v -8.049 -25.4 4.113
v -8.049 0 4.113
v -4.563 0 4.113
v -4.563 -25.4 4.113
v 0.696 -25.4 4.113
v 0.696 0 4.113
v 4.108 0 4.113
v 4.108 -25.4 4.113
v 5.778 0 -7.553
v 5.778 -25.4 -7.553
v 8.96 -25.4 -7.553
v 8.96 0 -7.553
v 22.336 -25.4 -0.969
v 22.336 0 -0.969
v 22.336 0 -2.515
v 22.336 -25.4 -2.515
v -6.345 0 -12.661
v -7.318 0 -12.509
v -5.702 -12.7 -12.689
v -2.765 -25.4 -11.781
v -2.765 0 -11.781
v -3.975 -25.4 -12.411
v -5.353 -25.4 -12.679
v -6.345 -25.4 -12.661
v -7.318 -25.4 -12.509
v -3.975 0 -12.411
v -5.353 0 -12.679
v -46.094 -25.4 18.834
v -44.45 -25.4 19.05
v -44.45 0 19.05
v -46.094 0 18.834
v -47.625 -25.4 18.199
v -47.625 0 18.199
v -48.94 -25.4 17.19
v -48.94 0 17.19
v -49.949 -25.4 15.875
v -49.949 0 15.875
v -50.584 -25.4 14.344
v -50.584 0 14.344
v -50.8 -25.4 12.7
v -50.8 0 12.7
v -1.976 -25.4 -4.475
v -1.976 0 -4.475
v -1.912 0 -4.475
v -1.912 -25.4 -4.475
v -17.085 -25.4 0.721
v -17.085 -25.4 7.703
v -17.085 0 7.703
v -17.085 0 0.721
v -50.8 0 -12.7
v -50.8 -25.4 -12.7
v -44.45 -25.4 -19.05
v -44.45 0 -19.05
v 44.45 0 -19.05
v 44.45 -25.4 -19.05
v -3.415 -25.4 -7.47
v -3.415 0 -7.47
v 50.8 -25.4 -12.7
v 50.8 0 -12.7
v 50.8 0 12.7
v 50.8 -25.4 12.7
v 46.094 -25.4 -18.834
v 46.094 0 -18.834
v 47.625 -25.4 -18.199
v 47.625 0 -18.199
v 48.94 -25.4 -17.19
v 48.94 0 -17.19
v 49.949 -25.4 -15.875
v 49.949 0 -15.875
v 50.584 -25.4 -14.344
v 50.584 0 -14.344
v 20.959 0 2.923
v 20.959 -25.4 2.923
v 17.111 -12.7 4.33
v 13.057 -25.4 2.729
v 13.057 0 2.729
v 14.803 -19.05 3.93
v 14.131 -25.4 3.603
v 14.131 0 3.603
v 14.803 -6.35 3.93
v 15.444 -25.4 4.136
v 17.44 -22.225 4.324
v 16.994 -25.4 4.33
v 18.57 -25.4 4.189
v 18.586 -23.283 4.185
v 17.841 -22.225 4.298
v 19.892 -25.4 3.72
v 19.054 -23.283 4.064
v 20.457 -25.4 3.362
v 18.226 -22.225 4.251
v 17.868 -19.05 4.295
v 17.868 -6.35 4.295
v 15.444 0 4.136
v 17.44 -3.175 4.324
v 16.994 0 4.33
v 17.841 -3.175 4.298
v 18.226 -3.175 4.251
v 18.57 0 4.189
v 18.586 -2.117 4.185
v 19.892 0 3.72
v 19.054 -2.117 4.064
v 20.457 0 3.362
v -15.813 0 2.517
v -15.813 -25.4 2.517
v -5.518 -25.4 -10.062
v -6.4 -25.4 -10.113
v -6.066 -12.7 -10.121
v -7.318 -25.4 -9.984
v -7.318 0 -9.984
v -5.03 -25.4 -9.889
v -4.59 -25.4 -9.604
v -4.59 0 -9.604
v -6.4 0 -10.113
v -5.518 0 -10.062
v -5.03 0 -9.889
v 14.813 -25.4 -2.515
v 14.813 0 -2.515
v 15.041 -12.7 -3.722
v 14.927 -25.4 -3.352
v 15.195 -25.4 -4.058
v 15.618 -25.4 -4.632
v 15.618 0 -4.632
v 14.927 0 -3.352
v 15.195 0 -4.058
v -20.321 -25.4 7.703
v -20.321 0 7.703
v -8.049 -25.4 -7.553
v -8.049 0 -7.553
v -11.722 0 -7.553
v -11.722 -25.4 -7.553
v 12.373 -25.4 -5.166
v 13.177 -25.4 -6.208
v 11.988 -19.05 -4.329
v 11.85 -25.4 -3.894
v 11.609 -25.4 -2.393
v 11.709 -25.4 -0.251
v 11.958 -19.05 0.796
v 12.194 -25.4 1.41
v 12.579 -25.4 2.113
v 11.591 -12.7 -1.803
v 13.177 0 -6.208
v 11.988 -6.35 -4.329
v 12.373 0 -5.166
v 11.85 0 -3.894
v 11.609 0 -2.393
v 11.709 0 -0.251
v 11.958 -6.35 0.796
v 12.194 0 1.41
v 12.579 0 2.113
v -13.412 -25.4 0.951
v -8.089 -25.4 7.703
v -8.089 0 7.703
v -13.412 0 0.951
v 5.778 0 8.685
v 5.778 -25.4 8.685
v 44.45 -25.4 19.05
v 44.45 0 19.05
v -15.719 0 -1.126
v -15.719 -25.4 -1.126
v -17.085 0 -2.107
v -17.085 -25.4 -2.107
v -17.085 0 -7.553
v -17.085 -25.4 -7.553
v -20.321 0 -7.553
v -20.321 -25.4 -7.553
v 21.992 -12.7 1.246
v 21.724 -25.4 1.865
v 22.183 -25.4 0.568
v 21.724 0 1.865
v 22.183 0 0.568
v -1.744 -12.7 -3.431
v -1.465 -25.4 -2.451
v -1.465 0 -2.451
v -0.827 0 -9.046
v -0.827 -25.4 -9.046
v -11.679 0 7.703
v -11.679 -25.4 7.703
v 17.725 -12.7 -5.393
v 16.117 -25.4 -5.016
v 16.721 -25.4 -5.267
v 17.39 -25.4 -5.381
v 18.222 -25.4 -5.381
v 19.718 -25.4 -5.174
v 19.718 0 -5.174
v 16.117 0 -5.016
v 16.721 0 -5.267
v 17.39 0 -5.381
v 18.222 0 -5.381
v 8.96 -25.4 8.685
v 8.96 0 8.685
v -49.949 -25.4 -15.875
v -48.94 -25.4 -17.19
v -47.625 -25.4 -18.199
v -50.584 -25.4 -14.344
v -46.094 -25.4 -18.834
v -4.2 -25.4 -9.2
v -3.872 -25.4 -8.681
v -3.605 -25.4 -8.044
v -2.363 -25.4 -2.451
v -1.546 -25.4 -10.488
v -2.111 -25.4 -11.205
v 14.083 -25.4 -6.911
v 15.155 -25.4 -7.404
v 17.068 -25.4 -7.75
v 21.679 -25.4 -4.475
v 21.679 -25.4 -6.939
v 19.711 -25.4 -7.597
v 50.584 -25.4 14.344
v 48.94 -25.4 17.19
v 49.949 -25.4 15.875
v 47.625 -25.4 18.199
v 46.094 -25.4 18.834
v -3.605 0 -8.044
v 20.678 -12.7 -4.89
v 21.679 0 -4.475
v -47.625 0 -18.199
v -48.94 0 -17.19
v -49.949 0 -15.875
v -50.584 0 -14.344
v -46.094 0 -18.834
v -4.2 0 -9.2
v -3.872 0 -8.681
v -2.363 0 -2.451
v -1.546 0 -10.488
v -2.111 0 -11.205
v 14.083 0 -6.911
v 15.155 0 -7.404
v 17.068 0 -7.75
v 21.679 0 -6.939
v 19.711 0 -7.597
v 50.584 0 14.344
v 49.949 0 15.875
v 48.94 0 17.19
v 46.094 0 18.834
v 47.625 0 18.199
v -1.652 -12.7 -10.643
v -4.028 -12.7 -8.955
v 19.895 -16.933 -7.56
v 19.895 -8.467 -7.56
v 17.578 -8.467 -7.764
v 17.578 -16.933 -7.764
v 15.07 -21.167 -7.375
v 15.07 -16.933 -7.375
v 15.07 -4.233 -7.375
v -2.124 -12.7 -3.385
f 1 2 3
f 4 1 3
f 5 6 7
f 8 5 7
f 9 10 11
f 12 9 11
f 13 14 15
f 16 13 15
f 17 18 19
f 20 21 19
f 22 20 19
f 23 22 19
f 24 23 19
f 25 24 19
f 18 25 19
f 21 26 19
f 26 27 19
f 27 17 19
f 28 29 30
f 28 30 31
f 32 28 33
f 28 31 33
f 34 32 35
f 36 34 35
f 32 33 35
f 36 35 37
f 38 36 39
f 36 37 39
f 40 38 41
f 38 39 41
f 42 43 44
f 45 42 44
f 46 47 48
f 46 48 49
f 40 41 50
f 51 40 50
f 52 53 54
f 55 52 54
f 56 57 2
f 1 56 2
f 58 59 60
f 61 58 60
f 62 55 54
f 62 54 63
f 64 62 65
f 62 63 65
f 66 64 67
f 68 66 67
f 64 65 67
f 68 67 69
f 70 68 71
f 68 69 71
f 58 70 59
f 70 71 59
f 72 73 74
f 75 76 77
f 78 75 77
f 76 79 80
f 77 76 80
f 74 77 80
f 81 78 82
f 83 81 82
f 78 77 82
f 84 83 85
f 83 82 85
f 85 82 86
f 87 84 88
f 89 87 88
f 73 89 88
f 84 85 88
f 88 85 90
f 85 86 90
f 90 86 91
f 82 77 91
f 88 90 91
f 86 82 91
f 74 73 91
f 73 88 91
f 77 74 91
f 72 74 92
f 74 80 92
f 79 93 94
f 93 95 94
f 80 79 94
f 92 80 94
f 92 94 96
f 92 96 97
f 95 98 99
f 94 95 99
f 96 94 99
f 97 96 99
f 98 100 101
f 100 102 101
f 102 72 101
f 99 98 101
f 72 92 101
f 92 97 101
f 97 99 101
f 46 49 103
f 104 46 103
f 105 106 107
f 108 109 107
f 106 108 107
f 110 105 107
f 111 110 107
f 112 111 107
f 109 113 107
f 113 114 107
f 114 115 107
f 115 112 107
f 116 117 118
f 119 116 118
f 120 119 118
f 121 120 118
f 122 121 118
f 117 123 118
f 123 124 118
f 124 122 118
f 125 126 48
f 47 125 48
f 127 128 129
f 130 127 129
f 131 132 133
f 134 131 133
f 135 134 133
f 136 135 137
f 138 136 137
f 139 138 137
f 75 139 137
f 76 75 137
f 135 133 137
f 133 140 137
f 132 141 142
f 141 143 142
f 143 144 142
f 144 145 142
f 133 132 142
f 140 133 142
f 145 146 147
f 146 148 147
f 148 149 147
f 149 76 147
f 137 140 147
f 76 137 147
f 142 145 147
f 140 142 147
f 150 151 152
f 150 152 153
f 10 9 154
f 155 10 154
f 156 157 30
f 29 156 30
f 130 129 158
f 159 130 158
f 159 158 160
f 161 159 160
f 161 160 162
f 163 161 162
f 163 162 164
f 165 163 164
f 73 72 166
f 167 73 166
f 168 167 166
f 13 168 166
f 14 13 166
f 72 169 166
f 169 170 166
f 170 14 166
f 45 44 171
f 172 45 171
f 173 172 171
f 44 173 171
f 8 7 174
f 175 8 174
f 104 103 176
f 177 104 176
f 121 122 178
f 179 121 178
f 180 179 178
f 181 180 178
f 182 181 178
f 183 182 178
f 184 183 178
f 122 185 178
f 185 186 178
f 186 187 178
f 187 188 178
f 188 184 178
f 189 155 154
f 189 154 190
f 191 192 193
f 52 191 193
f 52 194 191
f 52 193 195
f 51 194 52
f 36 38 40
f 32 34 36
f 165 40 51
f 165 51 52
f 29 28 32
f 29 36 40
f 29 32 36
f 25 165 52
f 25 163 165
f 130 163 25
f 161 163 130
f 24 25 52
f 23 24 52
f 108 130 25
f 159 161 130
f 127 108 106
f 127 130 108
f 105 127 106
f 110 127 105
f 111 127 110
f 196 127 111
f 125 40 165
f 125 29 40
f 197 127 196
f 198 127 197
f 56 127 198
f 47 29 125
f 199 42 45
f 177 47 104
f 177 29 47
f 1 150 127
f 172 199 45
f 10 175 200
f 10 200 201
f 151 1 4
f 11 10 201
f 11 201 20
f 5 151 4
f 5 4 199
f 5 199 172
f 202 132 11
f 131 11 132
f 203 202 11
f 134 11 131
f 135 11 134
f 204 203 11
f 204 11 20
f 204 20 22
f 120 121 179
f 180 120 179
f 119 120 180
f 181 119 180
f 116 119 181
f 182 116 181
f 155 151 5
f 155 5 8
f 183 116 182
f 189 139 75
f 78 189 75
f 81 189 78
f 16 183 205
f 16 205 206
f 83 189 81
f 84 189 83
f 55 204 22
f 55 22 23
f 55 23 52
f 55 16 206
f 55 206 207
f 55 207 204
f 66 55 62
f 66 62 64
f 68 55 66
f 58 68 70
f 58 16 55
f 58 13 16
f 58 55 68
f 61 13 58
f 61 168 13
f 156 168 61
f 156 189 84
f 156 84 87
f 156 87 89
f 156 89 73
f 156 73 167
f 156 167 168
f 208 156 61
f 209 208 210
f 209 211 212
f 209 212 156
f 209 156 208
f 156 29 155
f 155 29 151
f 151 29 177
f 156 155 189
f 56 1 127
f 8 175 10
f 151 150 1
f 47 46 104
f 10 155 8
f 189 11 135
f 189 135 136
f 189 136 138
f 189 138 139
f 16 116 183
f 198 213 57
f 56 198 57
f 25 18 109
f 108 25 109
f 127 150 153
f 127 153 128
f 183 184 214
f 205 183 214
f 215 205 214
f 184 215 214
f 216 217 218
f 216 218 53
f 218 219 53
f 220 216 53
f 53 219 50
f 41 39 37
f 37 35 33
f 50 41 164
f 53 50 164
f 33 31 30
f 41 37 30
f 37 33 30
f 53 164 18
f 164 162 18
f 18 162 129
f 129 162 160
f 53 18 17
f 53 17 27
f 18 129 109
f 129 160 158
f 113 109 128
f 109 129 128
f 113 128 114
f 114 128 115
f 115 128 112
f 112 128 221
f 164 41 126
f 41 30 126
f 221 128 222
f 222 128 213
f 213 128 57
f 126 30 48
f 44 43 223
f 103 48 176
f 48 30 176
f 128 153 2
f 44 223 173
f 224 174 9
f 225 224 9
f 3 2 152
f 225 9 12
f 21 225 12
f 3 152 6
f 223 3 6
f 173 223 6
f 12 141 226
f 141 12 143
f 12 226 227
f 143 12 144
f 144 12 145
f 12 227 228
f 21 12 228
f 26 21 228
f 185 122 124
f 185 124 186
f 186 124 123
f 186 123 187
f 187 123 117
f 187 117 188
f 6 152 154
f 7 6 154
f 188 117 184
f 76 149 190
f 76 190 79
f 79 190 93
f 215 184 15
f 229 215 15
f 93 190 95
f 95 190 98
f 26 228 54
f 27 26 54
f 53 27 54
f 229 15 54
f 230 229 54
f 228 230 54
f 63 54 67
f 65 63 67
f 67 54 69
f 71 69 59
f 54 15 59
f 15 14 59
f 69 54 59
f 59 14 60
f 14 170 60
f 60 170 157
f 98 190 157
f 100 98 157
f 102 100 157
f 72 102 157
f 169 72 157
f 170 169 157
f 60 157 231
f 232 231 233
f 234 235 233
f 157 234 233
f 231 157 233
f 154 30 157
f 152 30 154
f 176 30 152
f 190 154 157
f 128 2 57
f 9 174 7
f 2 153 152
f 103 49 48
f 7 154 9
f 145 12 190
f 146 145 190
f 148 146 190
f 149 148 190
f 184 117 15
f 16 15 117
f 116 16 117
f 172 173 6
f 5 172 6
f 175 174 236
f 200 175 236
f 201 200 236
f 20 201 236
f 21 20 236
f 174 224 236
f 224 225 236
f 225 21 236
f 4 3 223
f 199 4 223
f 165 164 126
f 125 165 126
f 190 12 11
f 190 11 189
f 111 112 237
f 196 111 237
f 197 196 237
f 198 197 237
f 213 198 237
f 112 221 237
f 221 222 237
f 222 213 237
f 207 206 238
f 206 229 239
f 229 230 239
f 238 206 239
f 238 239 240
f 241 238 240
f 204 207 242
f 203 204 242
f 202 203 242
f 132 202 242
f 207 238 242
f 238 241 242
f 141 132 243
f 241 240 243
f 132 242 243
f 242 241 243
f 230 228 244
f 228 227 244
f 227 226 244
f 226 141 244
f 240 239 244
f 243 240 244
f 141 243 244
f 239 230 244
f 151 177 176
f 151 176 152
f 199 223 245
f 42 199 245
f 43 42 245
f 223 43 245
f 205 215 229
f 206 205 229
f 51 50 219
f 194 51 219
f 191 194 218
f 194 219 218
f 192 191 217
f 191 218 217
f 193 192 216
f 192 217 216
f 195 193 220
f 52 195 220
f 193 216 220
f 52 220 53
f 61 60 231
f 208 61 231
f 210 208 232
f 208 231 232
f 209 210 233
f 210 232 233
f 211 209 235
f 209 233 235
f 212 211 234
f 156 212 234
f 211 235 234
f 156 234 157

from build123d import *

# Parameters (mm, degrees)
F0_W     = 3.1821551265
F0_H     = 16.2380066949
F1_DEPTH = 25.4


with BuildPart() as f1:
    # F0 (on Front) → F1 (new body)
    with BuildSketch(Plane.XZ):
        with BuildLine():
            ThreePointArc((50.8, 12.7), (48.9401280605, 17.1901280605), (44.45, 19.05))
            Line((44.45, 19.05), (-44.45, 19.05))
            ThreePointArc((-44.45, 19.05), (-48.9401280605, 17.1901280605), (-50.8, 12.7))
            Line((-50.8, 12.7), (-50.8, -12.7))
            ThreePointArc((-50.8, -12.7), (-48.9401280605, -17.1901280605), (-44.45, -19.05))
            Line((-44.45, -19.05), (44.45, -19.05))
            ThreePointArc((44.45, -19.05), (48.9401280605, -17.1901280605), (50.8, -12.7))
            Line((50.8, -12.7), (50.8, 12.7))
        make_face()
        with BuildLine():
            Line((-3.4147352544, -7.4699143124), (-8.0493956066, 4.1133974755))
            Line((-8.0493956066, 4.1133974755), (-4.563383065, 4.1133974755))
            Line((-4.563383065, 4.1133974755), (-2.3629211255, -2.4512583259))
            add(Edge.make_bspline(
                [(-2.3629211255, -2.4512583259), (-2.0790982653, -3.3060659989), (-1.9755863987, -4.4747483644)],
                knots=[0, 0, 0, 1, 1, 1], degree=2))
            Line((-1.9755863987, -4.4747483644), (-1.9121436417, -4.4747483644))
            add(Edge.make_bspline(
                [(-1.9121436417, -4.4747483644), (-1.7986144976, -3.3995605882), (-1.4647052503, -2.4512583259)],
                knots=[0, 0, 0, 1, 1, 1], degree=2))
            Line((-1.4647052503, -2.4512583259), (0.6956875795, 4.1133974755))
            Line((0.6956875795, 4.1133974755), (4.1082400867, 4.1133974755))
            Line((4.1082400867, 4.1133974755), (-0.826938588, -9.0459659596))
            add(Edge.make_bspline(
                [(-0.826938588, -9.0459659596), (-1.5081134525, -10.8724495421), (-2.7652817685, -11.7806826947)],
                knots=[0, 0, 0, 1, 1, 1], degree=2))
            add(Edge.make_bspline(
                [(-2.7652817685, -11.7806826947), (-4.0224500844, -12.6889158473), (-5.7020135982, -12.6889158473)],
                knots=[0, 0, 0, 1, 1, 1], degree=2))
            add(Edge.make_bspline(
                [(-5.7020135982, -12.6889158473), (-6.526769439, -12.6889158473), (-7.318134355, -12.5086048538)],
                knots=[0, 0, 0, 1, 1, 1], degree=2))
            Line((-7.318134355, -12.5086048538), (-7.318134355, -9.9842509444))
            add(Edge.make_bspline(
                [(-7.318134355, -9.9842509444), (-6.7438104497, -10.1211537358), (-6.0659746778, -10.1211537358)],
                knots=[0, 0, 0, 1, 1, 1], degree=2))
            add(Edge.make_bspline(
                [(-6.0659746778, -10.1211537358), (-5.2211842822, -10.1211537358), (-4.5900958048, -9.6035944025)],
                knots=[0, 0, 0, 1, 1, 1], degree=2))
            add(Edge.make_bspline(
                [(-4.5900958048, -9.6035944025), (-3.9590073275, -9.0860350692), (-3.6050635254, -8.0442382177)],
                knots=[0, 0, 0, 1, 1, 1], degree=2))
            Line((-3.6050635254, -8.0442382177), (-3.4147352544, -7.4699143124))
        make_face(mode=Mode.SUBTRACT)
        with BuildLine():
            add(Edge.make_bspline(
                [(19.8954692978, -7.5600698092), (18.9471670355, -7.76375445), (17.5781391217, -7.76375445)],
                knots=[0, 0, 0, 1, 1, 1], degree=2))
            add(Edge.make_bspline(
                [(17.5781391217, -7.76375445), (14.7632841672, -7.76375445), (13.1772152426, -6.2077373577)],
                knots=[0, 0, 0, 1, 1, 1], degree=2))
            add(Edge.make_bspline(
                [(13.1772152426, -6.2077373577), (11.5911463181, -4.6517202654), (11.5911463181, -1.8034743862)],
                knots=[0, 0, 0, 1, 1, 1], degree=2))
            add(Edge.make_bspline(
                [(11.5911463181, -1.8034743862), (11.5911463181, 1.1282488049), (13.0570079136, 2.7293436456)],
                knots=[0, 0, 0, 1, 1, 1], degree=2))
            add(Edge.make_bspline(
                [(13.0570079136, 2.7293436456), (14.5228695092, 4.3304384862), (17.1106661755, 4.3304384862)],
                knots=[0, 0, 0, 1, 1, 1], degree=2))
            add(Edge.make_bspline(
                [(17.1106661755, 4.3304384862), (19.5815946054, 4.3304384862), (20.9589702504, 2.923011009)],
                knots=[0, 0, 0, 1, 1, 1], degree=2))
            add(Edge.make_bspline(
                [(20.9589702504, 2.923011009), (22.3363458954, 1.5155835317), (22.3363458954, -0.968701268)],
                knots=[0, 0, 0, 1, 1, 1], degree=2))
            Line((22.3363458954, -0.968701268), (22.3363458954, -2.5147010829))
            Line((22.3363458954, -2.5147010829), (14.8133705543, -2.5147010829))
            add(Edge.make_bspline(
                [(14.8133705543, -2.5147010829), (14.8667960339, -3.8703726268), (15.6180918402, -4.6316857106)],
                knots=[0, 0, 0, 1, 1, 1], degree=2))
            add(Edge.make_bspline(
                [(15.6180918402, -4.6316857106), (16.3693876466, -5.3929987944), (17.7250591905, -5.3929987944)],
                knots=[0, 0, 0, 1, 1, 1], degree=2))
            add(Edge.make_bspline(
                [(17.7250591905, -5.3929987944), (18.7802124119, -5.3929987944), (19.7184973968, -5.1742882374)],
                knots=[0, 0, 0, 1, 1, 1], degree=2))
            add(Edge.make_bspline(
                [(19.7184973968, -5.1742882374), (20.6567823816, -4.9555776804), (21.6785446783, -4.4747483644)],
                knots=[0, 0, 0, 1, 1, 1], degree=2))
            Line((21.6785446783, -4.4747483644), (21.6785446783, -6.9389986093))
            add(Edge.make_bspline(
                [(21.6785446783, -6.9389986093), (20.8437715601, -7.3563851684), (19.8954692978, -7.5600698092)],
                knots=[0, 0, 0, 1, 1, 1], degree=2))
        make_face(mode=Mode.SUBTRACT)
        Polygon((-13.4119781178, 0.9512769038), (-8.0493956066, -7.5533916242), (-11.7223973266, -7.5533916242), (-15.7192910165, -1.1256386142), (-17.0849798378, -2.1073318012), (-17.0849798378, -7.5533916242), (-20.3205604439, -7.5533916242), (-20.3205604439, 7.7029218837), (-17.0849798378, 7.7029218837), (-17.0849798378, 0.7208795232), (-15.8127856057, 2.5173112736), (-11.6789891244, 7.7029218837), (-8.0894647162, 7.7029218837), align=None, mode=Mode.SUBTRACT)
        with Locations((7.3688638863, 0.5656117232)):
            Rectangle(F0_W, F0_H, mode=Mode.SUBTRACT)
    extrude(amount=F1_DEPTH)


solid = f1.part
